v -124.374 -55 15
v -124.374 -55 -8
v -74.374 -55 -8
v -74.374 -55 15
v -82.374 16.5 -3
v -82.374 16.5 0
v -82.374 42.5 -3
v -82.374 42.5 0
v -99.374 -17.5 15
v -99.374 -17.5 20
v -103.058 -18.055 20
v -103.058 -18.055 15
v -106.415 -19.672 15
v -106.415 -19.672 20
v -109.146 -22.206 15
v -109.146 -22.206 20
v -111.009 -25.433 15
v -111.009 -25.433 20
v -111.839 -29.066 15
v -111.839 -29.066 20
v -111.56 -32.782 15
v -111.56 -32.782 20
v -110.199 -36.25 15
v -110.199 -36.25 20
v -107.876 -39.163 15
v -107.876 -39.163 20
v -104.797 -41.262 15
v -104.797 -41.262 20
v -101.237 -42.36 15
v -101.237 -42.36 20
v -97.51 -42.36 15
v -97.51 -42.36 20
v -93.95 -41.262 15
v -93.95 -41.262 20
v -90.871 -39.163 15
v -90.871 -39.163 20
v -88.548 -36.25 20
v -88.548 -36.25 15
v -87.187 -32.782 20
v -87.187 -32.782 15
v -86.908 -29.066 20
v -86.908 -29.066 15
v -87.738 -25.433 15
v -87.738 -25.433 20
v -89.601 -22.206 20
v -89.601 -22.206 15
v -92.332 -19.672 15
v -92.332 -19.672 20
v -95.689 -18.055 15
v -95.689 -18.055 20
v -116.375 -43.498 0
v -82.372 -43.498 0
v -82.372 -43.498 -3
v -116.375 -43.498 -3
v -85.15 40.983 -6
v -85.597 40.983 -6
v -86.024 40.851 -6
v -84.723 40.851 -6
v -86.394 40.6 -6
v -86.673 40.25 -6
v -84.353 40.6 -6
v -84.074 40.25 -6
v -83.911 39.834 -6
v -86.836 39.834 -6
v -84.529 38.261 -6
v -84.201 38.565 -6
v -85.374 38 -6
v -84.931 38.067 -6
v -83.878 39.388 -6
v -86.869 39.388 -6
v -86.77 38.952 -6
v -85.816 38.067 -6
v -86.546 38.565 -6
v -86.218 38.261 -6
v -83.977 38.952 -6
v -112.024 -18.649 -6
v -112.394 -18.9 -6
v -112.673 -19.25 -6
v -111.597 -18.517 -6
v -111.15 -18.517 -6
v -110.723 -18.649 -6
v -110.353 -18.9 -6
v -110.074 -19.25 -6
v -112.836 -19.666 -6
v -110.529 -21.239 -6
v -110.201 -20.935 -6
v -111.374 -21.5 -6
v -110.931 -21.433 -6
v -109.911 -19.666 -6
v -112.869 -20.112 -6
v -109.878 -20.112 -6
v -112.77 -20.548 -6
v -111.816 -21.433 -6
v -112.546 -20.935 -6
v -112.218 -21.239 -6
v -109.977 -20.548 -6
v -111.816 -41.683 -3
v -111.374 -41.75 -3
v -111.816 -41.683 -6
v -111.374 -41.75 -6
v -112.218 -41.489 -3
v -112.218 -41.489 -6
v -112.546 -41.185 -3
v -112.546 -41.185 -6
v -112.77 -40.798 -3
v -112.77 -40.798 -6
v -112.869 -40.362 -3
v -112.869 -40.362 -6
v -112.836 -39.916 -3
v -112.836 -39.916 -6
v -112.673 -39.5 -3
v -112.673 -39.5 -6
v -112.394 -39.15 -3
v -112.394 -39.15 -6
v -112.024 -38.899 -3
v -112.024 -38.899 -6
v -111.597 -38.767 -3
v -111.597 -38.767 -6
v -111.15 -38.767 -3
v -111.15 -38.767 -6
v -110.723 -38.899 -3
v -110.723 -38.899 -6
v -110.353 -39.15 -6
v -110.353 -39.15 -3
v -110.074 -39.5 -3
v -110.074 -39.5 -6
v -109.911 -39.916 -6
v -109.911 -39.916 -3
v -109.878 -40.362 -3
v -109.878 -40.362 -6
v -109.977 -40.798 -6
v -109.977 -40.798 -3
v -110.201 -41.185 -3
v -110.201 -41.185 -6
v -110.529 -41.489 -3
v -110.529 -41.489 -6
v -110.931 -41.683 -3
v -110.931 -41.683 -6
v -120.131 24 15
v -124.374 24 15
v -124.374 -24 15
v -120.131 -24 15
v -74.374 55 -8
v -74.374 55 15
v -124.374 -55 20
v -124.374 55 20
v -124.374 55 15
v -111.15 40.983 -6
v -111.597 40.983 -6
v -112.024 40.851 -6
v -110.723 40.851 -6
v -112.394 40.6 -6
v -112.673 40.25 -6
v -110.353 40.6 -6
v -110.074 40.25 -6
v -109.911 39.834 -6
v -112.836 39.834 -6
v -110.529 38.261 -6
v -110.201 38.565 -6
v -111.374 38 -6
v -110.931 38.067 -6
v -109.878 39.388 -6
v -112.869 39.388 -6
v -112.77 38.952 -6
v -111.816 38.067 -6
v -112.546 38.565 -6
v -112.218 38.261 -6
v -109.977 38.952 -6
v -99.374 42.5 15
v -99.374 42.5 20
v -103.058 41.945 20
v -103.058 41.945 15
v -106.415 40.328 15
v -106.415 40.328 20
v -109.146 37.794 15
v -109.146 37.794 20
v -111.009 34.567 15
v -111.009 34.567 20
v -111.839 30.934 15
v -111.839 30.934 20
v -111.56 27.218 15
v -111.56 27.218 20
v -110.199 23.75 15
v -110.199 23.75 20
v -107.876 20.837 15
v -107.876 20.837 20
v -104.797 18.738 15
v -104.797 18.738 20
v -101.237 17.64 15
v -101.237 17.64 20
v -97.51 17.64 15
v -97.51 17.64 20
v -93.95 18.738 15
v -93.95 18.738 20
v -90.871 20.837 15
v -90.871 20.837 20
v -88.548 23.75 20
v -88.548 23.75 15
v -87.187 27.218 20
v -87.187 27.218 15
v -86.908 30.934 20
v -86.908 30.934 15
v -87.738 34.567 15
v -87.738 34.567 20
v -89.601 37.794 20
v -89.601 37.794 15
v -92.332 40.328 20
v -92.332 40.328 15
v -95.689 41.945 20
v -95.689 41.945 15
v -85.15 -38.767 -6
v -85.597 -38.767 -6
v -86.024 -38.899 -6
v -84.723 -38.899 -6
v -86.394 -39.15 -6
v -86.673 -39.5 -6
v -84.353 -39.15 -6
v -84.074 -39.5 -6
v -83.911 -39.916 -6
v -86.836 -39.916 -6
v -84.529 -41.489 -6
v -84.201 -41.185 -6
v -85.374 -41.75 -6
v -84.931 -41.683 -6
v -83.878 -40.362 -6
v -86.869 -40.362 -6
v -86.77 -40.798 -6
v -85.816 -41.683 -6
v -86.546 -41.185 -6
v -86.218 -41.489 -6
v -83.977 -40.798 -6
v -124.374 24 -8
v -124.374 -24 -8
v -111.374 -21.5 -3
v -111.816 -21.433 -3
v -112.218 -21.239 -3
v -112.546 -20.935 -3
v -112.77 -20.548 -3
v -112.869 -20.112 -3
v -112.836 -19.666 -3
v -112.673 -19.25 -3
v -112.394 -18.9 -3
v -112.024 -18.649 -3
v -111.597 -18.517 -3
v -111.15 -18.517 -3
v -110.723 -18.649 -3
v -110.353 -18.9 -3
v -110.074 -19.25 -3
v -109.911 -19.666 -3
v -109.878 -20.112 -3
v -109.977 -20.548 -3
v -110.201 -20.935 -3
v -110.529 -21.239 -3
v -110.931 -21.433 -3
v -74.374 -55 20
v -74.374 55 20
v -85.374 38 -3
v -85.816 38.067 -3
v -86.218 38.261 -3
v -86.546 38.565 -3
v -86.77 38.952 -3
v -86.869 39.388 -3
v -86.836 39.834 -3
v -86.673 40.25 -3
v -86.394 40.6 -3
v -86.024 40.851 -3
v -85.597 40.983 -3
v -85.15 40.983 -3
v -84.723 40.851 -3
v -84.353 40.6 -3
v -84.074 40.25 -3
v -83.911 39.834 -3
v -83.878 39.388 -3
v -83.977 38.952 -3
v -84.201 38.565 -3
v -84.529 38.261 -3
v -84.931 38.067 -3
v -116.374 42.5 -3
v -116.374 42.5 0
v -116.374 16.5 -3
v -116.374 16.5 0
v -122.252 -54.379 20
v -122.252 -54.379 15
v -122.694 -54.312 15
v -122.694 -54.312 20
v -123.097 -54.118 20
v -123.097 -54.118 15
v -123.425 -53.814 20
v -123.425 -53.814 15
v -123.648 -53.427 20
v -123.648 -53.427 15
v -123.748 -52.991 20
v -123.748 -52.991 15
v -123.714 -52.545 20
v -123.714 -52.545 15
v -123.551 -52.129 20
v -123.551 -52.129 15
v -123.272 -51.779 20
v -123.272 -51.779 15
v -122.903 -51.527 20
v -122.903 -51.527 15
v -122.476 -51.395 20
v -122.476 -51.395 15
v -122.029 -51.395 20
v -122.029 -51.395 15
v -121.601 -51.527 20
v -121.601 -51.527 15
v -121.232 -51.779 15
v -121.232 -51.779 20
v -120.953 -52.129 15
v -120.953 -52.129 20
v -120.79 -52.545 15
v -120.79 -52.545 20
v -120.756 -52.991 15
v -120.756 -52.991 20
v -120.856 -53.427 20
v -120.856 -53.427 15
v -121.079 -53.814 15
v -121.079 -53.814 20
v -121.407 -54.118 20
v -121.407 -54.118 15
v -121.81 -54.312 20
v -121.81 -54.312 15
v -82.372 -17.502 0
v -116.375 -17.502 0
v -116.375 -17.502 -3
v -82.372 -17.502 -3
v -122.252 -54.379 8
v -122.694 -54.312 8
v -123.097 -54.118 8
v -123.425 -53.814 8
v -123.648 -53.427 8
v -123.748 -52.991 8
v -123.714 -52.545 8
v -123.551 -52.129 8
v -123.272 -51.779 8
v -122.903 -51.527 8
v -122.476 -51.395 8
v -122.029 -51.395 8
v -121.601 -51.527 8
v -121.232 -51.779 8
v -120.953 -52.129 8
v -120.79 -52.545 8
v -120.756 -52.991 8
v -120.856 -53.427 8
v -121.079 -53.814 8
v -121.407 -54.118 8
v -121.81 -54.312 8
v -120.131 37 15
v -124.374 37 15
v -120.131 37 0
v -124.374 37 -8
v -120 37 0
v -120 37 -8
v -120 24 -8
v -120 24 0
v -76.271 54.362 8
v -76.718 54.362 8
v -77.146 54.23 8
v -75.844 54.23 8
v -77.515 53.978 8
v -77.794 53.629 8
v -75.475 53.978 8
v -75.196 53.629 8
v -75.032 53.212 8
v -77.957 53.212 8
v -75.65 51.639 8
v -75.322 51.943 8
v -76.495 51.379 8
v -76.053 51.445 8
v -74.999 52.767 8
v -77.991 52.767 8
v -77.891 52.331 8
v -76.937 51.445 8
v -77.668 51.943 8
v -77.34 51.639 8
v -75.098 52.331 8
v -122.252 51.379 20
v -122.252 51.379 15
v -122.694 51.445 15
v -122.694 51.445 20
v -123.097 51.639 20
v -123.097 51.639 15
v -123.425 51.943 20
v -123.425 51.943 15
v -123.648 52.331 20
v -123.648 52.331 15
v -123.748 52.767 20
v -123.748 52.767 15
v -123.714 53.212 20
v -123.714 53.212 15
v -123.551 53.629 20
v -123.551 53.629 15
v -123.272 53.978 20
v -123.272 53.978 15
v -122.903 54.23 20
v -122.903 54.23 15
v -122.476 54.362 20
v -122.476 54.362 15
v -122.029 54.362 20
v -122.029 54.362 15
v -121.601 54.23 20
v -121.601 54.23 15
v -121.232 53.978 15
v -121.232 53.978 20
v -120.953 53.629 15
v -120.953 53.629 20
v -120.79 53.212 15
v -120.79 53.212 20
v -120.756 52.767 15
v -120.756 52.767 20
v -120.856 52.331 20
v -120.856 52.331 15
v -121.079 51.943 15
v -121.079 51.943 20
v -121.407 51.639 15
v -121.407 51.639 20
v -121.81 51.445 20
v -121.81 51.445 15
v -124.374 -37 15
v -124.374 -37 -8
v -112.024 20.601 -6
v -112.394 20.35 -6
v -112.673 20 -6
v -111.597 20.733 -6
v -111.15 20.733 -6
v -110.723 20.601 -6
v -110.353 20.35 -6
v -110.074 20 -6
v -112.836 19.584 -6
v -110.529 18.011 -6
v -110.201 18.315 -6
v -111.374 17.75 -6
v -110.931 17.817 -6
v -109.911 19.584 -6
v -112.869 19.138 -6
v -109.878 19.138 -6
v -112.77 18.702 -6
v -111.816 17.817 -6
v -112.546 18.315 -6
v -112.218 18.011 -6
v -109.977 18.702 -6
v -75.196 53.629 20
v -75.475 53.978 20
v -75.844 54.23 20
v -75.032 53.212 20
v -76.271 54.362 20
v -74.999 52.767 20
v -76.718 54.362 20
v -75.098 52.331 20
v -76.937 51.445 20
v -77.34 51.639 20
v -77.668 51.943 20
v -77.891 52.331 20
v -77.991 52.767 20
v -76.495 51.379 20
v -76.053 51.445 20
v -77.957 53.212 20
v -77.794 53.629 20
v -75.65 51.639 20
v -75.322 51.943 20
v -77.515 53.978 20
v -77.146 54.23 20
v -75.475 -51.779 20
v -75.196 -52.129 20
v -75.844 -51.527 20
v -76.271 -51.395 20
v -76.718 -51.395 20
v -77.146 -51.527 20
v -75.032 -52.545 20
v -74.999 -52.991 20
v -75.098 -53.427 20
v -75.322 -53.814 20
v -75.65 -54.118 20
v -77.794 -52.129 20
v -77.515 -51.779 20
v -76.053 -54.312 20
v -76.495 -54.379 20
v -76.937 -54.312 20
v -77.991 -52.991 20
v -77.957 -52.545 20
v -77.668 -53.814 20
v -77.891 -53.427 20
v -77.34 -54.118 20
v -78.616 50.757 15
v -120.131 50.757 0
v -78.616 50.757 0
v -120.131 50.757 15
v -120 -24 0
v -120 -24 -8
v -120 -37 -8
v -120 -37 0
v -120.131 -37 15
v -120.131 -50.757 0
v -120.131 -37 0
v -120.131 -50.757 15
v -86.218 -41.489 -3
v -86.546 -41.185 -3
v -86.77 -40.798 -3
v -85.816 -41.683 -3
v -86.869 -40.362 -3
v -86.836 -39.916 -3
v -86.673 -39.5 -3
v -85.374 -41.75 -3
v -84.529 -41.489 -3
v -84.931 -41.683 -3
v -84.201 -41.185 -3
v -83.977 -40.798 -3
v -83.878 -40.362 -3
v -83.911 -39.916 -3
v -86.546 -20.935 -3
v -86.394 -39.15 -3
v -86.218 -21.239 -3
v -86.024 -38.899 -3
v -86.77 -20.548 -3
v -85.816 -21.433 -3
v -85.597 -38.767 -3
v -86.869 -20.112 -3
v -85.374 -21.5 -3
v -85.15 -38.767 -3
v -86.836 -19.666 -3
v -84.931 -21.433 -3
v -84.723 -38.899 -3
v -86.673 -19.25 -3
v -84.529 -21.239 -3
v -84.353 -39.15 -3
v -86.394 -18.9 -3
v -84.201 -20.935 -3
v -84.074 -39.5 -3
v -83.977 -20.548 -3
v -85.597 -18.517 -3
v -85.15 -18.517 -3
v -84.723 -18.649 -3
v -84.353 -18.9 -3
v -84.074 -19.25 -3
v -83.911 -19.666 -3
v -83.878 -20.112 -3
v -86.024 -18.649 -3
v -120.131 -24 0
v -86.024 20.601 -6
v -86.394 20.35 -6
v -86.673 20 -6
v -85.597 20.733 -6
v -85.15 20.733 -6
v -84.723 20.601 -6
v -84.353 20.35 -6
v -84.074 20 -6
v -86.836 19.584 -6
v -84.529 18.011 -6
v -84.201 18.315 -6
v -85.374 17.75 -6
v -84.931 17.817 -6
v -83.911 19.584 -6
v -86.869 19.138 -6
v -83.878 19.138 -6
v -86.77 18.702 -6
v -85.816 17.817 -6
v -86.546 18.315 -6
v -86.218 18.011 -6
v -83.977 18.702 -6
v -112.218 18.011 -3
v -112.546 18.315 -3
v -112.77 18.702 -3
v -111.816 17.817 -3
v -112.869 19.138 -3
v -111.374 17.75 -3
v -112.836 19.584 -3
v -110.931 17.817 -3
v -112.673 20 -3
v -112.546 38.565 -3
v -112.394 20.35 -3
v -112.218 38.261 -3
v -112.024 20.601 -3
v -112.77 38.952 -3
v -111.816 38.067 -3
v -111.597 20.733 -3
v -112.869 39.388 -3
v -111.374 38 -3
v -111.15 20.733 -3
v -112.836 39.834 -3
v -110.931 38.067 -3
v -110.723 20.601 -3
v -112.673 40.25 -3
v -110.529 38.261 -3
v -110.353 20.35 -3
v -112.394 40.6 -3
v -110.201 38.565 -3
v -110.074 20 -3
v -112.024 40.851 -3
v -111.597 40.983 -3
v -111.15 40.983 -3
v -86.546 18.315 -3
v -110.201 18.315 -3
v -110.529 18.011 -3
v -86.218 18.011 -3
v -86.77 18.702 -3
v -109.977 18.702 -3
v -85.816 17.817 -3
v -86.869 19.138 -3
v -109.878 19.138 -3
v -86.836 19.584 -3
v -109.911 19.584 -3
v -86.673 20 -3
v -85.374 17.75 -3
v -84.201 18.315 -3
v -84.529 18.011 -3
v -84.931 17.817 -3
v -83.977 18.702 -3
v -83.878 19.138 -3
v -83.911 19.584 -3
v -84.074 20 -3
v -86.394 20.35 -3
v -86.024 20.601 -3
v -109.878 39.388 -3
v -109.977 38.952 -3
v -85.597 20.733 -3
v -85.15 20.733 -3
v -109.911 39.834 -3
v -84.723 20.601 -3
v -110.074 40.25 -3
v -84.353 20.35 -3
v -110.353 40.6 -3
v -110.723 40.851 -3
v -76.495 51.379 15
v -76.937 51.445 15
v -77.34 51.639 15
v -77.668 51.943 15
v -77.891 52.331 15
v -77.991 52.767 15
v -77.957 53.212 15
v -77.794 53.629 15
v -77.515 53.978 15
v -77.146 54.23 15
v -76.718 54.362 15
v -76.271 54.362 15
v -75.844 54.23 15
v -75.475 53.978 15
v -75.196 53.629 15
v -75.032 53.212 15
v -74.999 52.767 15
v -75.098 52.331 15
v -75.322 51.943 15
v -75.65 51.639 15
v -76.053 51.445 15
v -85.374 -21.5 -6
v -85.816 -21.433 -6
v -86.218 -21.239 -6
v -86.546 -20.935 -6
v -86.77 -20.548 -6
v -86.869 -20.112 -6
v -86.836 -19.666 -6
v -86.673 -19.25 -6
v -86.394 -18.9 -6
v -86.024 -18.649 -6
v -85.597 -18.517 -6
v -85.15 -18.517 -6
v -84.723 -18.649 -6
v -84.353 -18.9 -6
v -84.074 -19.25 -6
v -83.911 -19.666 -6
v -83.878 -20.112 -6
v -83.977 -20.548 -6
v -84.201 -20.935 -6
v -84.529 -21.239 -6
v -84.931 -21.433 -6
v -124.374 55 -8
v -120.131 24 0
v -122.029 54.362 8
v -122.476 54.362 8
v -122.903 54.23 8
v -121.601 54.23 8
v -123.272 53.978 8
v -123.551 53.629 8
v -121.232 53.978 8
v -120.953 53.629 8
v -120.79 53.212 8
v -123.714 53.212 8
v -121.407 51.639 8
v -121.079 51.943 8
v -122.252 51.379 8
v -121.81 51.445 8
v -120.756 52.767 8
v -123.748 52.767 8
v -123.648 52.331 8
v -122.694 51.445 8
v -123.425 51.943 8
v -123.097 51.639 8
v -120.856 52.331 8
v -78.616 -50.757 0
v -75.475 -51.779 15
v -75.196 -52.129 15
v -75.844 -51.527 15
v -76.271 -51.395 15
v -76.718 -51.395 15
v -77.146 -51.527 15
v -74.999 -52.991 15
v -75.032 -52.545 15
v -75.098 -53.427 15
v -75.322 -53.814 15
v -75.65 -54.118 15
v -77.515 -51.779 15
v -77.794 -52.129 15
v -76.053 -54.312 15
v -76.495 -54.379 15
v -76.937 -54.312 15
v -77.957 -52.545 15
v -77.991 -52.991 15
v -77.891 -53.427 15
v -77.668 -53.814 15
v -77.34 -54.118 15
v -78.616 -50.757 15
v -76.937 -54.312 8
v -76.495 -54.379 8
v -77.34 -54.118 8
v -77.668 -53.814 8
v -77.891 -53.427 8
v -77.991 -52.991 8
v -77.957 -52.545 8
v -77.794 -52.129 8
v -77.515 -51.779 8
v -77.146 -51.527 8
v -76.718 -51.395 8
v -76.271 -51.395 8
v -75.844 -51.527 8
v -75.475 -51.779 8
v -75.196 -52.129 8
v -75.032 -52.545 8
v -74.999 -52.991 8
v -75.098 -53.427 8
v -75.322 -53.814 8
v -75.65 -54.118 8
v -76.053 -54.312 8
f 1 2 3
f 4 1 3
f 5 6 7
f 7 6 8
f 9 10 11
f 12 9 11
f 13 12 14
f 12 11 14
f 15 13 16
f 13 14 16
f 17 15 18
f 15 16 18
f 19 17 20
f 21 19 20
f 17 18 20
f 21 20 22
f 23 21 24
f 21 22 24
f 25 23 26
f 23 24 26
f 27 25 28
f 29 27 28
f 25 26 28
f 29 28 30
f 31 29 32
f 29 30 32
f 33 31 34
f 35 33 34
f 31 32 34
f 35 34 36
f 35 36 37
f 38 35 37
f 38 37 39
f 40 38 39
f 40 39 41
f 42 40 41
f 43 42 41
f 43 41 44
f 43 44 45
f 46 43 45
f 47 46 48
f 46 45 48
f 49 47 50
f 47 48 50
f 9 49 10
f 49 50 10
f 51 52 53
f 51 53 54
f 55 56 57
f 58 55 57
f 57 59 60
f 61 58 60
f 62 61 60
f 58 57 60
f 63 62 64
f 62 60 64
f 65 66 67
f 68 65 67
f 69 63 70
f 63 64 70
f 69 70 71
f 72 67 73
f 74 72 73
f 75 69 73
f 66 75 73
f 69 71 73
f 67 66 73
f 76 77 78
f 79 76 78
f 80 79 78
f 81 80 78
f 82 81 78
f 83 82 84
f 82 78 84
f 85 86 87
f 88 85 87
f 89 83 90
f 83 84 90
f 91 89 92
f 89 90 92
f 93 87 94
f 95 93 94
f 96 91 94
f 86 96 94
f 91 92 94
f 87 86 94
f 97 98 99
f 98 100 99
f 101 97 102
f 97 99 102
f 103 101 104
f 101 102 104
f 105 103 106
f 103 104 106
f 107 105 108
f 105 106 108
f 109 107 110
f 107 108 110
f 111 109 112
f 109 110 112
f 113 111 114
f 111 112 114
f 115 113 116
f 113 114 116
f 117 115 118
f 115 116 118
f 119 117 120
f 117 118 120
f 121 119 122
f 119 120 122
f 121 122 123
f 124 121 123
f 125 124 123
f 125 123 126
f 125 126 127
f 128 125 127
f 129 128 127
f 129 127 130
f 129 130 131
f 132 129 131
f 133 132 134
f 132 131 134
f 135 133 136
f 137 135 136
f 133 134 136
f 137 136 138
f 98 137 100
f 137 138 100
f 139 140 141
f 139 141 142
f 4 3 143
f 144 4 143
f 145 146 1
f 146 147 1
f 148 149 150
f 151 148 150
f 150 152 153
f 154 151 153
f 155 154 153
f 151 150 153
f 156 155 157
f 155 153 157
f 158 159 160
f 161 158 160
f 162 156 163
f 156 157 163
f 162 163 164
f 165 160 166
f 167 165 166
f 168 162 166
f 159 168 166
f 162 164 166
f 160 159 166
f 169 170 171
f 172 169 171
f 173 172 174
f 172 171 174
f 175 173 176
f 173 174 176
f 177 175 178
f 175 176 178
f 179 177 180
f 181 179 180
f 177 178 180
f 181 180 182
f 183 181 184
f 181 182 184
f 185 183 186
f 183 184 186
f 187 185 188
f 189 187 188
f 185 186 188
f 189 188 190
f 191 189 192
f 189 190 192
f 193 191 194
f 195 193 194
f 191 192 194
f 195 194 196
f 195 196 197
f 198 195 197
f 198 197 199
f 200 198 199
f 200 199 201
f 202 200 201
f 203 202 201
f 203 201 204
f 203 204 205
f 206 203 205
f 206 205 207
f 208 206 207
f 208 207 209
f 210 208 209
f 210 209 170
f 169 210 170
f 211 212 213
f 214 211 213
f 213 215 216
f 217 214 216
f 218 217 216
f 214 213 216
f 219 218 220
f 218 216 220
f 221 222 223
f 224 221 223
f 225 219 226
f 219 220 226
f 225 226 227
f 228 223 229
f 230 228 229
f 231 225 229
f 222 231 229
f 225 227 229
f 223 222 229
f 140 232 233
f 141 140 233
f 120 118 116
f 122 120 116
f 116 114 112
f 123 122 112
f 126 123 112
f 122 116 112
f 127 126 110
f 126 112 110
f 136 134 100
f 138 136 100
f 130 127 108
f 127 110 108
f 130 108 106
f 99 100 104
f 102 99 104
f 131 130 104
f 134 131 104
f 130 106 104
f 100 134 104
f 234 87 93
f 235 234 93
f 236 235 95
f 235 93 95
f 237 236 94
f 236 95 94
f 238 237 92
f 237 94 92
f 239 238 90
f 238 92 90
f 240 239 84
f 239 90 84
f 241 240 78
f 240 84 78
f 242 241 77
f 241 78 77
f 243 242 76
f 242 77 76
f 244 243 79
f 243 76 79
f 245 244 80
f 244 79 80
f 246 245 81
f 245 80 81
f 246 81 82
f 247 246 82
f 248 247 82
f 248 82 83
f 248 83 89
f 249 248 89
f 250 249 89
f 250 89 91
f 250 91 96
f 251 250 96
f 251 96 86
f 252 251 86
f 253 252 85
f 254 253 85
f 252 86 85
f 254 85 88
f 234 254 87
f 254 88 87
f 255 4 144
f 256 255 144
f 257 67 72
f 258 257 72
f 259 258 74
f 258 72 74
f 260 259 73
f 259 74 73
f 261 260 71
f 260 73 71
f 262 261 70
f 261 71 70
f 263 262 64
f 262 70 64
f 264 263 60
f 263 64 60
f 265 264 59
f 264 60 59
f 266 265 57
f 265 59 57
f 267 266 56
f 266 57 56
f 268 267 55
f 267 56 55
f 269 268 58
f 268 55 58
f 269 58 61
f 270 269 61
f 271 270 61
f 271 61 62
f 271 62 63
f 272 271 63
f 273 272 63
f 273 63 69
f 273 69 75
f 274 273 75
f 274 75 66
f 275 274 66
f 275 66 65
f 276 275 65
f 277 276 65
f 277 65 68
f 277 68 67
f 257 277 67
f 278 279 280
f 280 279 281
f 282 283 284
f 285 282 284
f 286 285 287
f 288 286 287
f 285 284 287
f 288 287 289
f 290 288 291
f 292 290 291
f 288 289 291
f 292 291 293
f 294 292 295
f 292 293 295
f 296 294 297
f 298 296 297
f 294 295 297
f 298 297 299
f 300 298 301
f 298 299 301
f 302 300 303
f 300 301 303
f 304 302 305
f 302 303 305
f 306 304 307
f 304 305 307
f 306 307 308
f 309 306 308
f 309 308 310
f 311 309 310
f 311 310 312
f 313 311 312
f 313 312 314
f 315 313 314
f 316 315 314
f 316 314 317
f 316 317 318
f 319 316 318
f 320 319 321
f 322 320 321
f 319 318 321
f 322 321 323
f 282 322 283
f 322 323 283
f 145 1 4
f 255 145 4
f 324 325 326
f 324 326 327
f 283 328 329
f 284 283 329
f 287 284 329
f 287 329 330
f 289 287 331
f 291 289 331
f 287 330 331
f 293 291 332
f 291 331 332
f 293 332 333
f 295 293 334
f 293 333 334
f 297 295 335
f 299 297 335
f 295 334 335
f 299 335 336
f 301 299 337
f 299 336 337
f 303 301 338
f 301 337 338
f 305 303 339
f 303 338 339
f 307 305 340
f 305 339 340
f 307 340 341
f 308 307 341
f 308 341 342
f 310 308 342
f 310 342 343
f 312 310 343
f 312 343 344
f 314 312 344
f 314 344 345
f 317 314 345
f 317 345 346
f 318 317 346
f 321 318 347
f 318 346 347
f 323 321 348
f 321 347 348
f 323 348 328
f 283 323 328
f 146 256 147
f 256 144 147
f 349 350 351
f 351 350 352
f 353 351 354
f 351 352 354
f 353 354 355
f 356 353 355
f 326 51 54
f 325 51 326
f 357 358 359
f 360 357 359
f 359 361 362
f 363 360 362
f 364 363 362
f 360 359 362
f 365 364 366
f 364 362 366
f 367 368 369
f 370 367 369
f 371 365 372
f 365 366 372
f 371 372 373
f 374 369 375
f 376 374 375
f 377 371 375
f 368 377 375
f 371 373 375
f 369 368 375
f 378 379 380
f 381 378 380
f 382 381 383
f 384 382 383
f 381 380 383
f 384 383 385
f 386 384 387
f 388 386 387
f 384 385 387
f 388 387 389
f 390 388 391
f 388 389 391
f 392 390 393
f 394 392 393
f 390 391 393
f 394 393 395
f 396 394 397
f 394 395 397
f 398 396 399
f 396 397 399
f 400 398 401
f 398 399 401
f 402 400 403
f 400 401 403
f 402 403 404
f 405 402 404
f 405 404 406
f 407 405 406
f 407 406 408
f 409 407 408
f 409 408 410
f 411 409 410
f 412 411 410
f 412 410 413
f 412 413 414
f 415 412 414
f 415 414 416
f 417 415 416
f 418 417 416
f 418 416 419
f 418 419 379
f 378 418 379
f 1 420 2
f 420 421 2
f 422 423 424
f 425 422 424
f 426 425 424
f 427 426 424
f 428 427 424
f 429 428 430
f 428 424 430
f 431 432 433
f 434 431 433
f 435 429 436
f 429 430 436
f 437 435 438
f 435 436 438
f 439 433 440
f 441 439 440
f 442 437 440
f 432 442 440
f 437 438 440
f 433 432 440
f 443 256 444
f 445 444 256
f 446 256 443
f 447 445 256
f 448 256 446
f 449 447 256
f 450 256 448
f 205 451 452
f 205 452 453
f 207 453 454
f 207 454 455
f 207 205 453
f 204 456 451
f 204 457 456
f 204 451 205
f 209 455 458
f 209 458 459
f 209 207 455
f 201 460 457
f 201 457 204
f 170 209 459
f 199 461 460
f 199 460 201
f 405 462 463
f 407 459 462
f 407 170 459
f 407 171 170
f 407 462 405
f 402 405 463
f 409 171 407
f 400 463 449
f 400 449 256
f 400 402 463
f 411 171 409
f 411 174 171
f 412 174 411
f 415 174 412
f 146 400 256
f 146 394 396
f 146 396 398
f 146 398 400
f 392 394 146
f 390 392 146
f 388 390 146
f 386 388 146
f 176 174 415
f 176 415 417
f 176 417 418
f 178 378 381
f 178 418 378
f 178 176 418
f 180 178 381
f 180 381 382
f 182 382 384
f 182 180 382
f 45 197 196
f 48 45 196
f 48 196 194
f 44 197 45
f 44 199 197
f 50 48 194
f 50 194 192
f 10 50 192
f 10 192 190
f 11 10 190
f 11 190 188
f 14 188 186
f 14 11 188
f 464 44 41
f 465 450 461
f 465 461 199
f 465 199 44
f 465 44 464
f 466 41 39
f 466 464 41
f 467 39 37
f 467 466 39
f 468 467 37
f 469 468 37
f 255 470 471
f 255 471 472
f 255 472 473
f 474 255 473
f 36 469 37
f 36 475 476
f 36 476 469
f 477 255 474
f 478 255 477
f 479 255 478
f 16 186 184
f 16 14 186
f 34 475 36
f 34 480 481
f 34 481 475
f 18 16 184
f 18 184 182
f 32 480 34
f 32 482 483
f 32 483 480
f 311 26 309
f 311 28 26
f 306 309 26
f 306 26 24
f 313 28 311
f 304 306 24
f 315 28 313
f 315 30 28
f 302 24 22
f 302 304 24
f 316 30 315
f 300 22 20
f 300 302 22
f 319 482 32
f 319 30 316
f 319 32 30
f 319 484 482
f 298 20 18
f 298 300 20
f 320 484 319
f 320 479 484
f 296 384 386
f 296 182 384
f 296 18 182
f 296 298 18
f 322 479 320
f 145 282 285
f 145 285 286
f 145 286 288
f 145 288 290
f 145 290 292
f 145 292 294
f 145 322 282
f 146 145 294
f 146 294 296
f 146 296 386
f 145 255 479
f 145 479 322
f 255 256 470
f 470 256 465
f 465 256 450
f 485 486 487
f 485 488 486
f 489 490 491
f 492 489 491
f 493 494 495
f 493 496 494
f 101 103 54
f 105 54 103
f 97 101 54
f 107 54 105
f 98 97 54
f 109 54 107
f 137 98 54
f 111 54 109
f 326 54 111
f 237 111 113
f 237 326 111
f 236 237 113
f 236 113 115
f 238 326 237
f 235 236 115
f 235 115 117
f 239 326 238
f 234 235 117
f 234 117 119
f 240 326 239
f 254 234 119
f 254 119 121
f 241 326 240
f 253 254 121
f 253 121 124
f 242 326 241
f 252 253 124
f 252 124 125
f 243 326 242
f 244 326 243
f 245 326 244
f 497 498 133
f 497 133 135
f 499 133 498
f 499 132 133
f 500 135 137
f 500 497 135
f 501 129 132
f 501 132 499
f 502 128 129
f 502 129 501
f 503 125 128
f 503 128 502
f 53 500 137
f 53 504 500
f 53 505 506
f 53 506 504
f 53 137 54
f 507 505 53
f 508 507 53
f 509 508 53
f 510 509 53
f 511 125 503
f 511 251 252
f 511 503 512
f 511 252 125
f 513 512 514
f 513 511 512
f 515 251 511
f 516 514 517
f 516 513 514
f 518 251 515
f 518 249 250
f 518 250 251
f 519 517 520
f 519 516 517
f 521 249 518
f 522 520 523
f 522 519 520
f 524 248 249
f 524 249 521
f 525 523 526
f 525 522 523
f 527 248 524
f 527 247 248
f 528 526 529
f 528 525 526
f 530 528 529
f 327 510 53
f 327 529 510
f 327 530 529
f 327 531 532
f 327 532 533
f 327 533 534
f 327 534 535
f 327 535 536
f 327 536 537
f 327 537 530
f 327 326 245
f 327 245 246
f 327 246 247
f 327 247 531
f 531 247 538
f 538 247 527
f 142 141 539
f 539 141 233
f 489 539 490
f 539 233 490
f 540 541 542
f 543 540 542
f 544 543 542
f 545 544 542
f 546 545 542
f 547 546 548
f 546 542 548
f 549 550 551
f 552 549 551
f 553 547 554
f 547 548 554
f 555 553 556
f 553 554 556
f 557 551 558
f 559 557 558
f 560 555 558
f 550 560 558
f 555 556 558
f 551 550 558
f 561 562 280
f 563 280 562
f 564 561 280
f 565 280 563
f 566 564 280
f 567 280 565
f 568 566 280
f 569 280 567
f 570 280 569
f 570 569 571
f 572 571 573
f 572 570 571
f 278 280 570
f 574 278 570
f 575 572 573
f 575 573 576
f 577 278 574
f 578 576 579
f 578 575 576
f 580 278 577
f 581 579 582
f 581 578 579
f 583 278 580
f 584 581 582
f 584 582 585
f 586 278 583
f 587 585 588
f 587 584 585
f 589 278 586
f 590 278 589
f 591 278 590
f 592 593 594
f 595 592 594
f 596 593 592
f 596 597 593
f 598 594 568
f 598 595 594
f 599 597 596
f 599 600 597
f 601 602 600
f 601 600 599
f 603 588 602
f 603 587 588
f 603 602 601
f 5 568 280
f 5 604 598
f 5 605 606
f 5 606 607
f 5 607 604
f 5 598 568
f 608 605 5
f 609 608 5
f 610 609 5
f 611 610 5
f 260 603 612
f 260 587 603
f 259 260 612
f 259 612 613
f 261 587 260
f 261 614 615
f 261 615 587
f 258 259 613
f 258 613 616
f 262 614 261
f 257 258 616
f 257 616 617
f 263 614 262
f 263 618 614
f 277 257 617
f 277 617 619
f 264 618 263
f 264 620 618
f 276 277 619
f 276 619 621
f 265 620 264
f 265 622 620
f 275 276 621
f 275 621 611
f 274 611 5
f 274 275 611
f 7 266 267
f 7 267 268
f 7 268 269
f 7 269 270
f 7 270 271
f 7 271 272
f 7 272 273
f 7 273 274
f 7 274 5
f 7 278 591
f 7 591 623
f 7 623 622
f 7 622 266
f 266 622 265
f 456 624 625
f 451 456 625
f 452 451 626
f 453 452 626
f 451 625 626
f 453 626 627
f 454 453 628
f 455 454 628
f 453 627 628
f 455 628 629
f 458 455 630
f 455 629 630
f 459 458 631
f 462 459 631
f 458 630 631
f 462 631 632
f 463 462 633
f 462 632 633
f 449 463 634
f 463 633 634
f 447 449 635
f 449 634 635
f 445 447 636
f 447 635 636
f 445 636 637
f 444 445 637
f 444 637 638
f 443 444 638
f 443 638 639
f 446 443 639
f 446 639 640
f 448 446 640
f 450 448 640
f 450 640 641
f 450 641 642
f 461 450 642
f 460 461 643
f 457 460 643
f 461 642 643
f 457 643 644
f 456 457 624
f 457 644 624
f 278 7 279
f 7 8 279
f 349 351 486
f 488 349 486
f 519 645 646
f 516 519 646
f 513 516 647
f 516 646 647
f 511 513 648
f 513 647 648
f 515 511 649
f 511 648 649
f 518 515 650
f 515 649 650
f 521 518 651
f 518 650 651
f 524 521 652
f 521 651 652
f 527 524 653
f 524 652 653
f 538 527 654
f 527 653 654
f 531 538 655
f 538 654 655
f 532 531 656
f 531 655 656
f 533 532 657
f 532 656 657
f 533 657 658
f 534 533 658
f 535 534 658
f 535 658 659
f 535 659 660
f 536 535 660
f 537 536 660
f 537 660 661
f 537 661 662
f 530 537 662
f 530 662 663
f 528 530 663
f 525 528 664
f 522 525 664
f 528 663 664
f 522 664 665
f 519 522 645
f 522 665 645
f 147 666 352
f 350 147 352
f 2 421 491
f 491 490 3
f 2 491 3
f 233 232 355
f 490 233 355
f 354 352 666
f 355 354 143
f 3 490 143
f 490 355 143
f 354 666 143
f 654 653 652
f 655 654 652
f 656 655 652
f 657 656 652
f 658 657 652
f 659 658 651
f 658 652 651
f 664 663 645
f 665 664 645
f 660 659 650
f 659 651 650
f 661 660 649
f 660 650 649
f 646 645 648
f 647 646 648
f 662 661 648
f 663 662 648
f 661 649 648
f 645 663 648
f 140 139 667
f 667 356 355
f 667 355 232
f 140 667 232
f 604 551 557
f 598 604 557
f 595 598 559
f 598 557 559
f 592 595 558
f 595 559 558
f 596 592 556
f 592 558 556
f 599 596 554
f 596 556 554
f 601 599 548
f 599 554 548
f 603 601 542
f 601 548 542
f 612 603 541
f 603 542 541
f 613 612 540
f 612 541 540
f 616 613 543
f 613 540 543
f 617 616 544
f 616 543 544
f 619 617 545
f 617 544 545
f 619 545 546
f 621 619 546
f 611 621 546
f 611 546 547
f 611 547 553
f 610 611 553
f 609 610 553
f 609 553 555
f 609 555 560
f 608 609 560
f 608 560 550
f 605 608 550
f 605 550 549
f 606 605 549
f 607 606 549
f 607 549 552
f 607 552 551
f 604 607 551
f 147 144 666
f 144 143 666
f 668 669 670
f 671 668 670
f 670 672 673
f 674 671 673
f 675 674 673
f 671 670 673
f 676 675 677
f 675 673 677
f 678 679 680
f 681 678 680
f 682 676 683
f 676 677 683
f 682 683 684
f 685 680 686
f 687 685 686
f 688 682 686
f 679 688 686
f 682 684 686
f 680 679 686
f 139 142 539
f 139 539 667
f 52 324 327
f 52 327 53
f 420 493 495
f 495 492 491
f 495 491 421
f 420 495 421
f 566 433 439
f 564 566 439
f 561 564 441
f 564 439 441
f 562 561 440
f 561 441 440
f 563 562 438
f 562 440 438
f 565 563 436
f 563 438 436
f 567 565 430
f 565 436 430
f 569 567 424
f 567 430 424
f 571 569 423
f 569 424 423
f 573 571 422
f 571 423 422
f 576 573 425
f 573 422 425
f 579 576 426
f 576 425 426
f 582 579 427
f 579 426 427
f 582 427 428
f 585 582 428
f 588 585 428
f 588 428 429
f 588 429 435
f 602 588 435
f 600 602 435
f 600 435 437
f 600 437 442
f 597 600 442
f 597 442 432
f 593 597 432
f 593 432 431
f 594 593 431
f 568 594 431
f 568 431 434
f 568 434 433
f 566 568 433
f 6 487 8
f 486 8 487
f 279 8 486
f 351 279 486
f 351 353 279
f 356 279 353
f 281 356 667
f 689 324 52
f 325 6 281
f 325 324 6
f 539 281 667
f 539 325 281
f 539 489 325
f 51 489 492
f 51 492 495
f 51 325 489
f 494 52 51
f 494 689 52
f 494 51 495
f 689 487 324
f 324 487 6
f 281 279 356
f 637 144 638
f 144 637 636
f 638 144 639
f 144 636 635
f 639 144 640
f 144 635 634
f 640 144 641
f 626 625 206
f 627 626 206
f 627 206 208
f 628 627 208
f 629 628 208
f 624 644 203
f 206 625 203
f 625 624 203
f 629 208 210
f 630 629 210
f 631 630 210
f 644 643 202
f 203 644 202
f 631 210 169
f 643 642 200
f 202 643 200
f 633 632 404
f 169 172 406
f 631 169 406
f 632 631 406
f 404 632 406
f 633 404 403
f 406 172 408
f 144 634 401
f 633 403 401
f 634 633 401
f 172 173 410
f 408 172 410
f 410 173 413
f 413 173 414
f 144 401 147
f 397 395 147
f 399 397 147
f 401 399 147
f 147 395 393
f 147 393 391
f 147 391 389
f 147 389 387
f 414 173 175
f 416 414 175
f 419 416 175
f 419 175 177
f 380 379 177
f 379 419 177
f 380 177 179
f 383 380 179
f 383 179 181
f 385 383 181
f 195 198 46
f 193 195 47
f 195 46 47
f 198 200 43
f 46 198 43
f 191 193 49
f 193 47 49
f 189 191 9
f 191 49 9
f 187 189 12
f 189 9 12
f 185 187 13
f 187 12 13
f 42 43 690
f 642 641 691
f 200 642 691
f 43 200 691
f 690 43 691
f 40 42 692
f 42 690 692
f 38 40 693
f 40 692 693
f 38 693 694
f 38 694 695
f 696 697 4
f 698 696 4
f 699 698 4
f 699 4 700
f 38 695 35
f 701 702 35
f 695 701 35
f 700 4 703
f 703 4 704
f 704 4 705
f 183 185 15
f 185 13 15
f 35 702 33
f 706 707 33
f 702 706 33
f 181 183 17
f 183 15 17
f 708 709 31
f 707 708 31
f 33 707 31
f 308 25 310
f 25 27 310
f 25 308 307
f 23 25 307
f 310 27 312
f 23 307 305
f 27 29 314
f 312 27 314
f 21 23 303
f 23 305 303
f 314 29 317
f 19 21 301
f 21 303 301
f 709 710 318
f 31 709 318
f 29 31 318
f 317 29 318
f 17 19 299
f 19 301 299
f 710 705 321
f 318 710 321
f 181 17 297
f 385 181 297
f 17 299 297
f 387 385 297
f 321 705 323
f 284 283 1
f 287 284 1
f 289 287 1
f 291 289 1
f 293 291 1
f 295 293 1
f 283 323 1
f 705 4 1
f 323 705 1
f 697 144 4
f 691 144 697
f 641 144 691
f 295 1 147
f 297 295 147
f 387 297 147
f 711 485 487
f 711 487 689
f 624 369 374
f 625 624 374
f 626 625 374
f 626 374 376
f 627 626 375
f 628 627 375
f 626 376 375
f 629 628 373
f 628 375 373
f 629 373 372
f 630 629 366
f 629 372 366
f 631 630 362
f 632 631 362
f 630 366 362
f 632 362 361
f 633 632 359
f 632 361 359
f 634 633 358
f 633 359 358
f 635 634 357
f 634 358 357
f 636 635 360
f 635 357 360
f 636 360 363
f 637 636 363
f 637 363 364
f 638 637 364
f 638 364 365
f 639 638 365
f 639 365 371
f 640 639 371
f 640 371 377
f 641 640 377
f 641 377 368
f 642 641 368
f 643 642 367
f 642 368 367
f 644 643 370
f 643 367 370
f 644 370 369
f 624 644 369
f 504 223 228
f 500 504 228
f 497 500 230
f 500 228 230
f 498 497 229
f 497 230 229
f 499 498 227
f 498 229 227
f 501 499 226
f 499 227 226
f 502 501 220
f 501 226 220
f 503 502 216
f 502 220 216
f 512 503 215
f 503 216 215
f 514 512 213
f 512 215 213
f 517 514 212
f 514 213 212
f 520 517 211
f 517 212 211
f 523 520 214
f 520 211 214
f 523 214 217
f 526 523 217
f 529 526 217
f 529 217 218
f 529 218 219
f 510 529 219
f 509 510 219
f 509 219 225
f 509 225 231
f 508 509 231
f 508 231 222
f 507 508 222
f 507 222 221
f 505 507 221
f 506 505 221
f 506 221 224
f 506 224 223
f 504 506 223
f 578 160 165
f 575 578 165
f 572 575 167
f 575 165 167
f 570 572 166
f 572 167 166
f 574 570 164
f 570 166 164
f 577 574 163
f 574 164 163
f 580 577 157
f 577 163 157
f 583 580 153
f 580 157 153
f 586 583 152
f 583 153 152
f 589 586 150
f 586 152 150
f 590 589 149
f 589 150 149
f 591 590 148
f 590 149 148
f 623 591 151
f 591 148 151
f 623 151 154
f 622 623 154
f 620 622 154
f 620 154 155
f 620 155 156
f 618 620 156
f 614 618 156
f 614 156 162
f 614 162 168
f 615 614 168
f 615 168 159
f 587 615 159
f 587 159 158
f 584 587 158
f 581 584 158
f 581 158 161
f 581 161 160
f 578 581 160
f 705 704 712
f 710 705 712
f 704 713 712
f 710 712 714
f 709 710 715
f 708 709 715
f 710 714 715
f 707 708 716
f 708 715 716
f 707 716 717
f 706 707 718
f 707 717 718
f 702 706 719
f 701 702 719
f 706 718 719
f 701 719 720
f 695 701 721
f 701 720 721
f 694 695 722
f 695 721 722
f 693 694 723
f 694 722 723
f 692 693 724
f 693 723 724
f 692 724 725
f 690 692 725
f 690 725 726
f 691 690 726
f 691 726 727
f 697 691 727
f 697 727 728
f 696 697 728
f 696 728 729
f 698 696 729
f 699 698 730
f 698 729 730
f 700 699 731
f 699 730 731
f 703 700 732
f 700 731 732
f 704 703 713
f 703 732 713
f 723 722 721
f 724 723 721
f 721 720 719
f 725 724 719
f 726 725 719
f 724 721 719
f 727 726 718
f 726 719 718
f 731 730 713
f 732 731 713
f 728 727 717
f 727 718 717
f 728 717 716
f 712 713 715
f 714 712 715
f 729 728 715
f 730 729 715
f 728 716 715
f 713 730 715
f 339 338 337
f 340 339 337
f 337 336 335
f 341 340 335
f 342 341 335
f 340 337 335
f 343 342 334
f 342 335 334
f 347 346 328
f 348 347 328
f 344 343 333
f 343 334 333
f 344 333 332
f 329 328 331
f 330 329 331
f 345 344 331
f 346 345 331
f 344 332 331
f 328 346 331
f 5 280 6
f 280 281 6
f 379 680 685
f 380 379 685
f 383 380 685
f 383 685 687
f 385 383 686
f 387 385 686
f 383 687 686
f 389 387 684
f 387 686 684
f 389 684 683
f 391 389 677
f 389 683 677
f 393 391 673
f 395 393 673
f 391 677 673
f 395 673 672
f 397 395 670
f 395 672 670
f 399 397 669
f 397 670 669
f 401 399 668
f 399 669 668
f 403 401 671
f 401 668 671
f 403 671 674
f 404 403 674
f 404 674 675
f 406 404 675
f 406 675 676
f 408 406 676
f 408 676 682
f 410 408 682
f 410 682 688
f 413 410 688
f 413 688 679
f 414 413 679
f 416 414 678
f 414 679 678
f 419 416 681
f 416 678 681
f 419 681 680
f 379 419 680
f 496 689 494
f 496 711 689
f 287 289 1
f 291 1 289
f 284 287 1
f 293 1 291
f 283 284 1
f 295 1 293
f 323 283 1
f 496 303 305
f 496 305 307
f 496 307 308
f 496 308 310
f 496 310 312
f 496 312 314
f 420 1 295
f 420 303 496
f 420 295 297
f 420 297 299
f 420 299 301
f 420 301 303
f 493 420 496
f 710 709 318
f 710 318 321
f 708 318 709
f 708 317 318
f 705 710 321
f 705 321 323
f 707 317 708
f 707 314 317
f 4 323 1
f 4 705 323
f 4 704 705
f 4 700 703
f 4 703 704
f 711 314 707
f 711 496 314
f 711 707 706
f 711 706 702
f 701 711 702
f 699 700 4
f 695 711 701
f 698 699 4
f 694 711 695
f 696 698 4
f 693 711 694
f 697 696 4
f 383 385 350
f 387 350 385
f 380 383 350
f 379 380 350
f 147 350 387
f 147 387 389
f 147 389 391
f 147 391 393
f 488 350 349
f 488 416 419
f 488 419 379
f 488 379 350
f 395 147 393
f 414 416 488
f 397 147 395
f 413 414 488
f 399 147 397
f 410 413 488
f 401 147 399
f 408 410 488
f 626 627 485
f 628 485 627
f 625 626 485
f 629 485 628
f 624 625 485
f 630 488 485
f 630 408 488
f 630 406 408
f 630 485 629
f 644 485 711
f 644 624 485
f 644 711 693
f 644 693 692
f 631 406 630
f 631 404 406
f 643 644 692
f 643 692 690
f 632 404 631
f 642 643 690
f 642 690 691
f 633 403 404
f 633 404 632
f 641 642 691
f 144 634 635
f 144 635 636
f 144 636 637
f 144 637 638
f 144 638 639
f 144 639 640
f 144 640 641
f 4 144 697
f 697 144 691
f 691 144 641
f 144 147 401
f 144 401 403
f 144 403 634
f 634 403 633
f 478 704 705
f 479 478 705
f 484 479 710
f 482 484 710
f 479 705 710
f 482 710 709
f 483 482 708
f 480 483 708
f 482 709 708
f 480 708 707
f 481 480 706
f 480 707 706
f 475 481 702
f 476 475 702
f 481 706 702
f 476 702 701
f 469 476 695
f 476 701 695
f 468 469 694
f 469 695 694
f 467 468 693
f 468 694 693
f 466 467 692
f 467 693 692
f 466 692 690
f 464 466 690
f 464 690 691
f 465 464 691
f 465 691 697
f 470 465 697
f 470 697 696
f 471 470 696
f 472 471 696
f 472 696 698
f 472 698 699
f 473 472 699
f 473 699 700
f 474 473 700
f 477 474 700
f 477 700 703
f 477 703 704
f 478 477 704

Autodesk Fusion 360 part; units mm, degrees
sketch "Bottom Base" plane through (0, 0, 0) normal (0, 0, 1) x (1, 0, 0)
  line L0 (-74.3735, 55) -> (-124.3735, 55)
  line L1 (-124.3735, 55) -> (-124.3735, -55)
  line L2 (-124.3735, -55) -> (-74.3735, -55)
  line L3 (-74.3735, -55) -> (-74.3735, 55)
  line L4 (-82.3735, 42.5) -> (-116.3735, 42.5)
  line L5 (-116.3735, 42.5) -> (-116.3735, 16.5)
  line L6 (-116.3735, 16.5) -> (-82.3735, 16.5)
  line L7 (-82.3735, 16.5) -> (-82.3735, 42.5)
  line L8 (-82.3735, 42.5) -> (-116.3735, 16.5) construction
  line L9 (-116.3735, 42.5) -> (-82.3735, 16.5) construction
  line L10 (-116.3754, -17.5022) -> (-82.3715, -17.5022)
  line L11 (-82.3715, -17.5022) -> (-82.3715, -43.4978)
  line L12 (-82.3715, -43.4978) -> (-116.3754, -43.4978)
  line L13 (-116.3754, -43.4978) -> (-116.3754, -17.5022)
  line L14 (-116.3754, -17.5022) -> (-82.3715, -43.4978) construction
  line L15 (-82.3715, -17.5022) -> (-116.3754, -43.4978) construction
  line L16 (-82.3735, 42.5) -> (-82.3735, 39.5)
  line L17 (-82.3735, 39.5) -> (-85.3735, 39.5)
  line L18 (-82.3735, 39.5) -> (-111.3735, 39.5)
  line L19 (-124.3735, 37) -> (-124.3735, 24)
  line L20 (-124.3735, -24) -> (-124.3735, -37)
  line L21 (-124.3735, 37) -> (-120, 37)
  line L22 (-120, 37) -> (-120, 24)
  line L23 (-120, 24) -> (-124.3735, 24)
  line L24 (-124.3735, -24) -> (-120, -24)
  line L25 (-120, -24) -> (-120, -37)
  line L26 (-120, -37) -> (-124.3735, -37)
  line L27 (-85.3735, 39.5) -> (-85.3735, 19.25)
  line L28 (-85.3735, 19.25) -> (-111.3735, 19.25)
  line L29 (-99.3735, -30.5) -> (-99.3735, -30)
  curve L30
  curve L31
  point P0 (-99.3735, 29.5)
  point P1 (-99.3735, -30.5)
  point P2 (-124.3735, 30.5)
  point P3 (-124.3735, -30.5)
  point P4 (-111.3735, -40.25)
  point P5 (-85.3735, -40.25)
  point P6 (-111.3735, -20)
  point P7 (-85.3735, -20)
  dimension "d1" = 110
  dimension "d2" = 50
  dimension "d10" = 34
  dimension "d11" = 26
  dimension "d14" = 3
  dimension "d15" = 3
  dimension "d16" = 29
  dimension "d26" = 13
  dimension "d62" = 20.25
  dimension "d63" = 26
  dimension "d68" = 15
extrude "Extrude1" add sketch "Bottom Base" along normal blind 15 and the other way blind 8 contours L0 L1 L2 L3 L21 L22 L23 L24 L25 L26 | L4 L5 L6 L7 L16 | L10 L11 L12 L13 makes body 1
sketch "Top Base" plane through (0, 0, 15) normal (0, 0, 1) x (-1, 0, 0)
  line L0 (74.3735, 55) -> (74.3735, -55)
  line L1 (74.3735, -55) -> (124.3735, -55)
  line L2 (124.3735, -55) -> (124.3735, 55)
  line L3 (124.3735, 55) -> (74.3735, 55)
  line L4 (74.3735, 55) -> (78.6161, 50.7574)
  line L5 (74.3735, 55) -> (80.3735, 55) construction
  line L6 (74.3735, -55) -> (78.6161, -50.7574)
  line L7 (74.3735, -55) -> (80.3735, -55) construction
  line L8 (124.3735, -55) -> (120.1308, -50.7574)
  line L9 (124.3735, -55) -> (115.8882, -55) construction
  line L10 (120.1308, -50.7574) -> (78.6161, -50.7574)
  line L11 (78.6161, -50.7574) -> (78.6161, 50.7574)
  line L12 (78.6161, 50.7574) -> (120.1308, 50.7574)
  line L13 (120.1308, 50.7574) -> (120.1308, -50.7574)
  dimension "d32" = 45
  dimension "d33" = 6
  dimension "d34" = 45
  dimension "d35" = 6
  dimension "d37" = 6
extrude "Extrude3" cut sketch "Bottom Base" against normal blind 3 contours L4 L5 L6 L7 L16 | L10 L11 L12 L13 bodies 1
extrude "Extrude5" cut sketch "Bottom Base" along normal blind 15 contours L1 L19 L21 L22 L23 bodies 1
extrude "Extrude6" cut sketch "Bottom Base" along normal blind 15 contours L1 L20 L24 L25 L26 bodies 1
extrude "Extrude7" cut sketch "Top Base" against normal blind 15 contours L10 L11 L12 L13 bodies 1
extrude "Extrude8" add sketch "Top Base" along normal blind 5 separate body makes body 2
sketch "Panel Fasteners" plane through (0, 0, 20) normal (0, 0, 1) x (-1, 0, 0)
  line L0 (124.3735, 55) -> (74.3735, 55)
  line L1 (74.3735, 55) -> (74.3735, -55)
  line L2 (74.3735, -55) -> (124.3735, -55)
  line L3 (124.3735, -55) -> (124.3735, 55)
  line L4 (74.3735, 55) -> (76.4948, 52.8787)
  line L5 (74.3735, 55) -> (77.3735, 55) construction
  line L6 (74.3735, -55) -> (76.4948, -52.8787)
  line L7 (74.3735, -55) -> (77.3735, -55) construction
  line L8 (124.3735, -55) -> (122.2521, -52.8787)
  line L9 (124.3735, -55) -> (121.3735, -55) construction
  line L10 (124.3735, 55) -> (122.2521, 52.8787)
  line L11 (124.3735, 55) -> (121.3735, 55) construction
  dimension "d47" = 45
  dimension "d48" = 3
  dimension "d49" = 45
  dimension "d50" = 3
  dimension "d54" = 45
  dimension "d55" = 3
  dimension "d56" = 45
  dimension "d57" = 3
hole "Hole4" at (-76.4948, -52.8787, 20) at (-122.2521, -52.8787, 20) at (-122.2521, 52.8787, 20) at (-76.4948, 52.8787, 20) direction (0, 0, -1) diameter 3 depth 12 tip angle 180 bodies 1 2
hole "Hole5" at (-111.3735, 19.25, 0) at (-111.3735, 39.5, 0) at (-85.3735, 39.5, 0) at (-85.3735, 19.25, 0) at (-111.3735, -20, 0) at (-111.3735, -40.25, 0) at (-85.3735, -40.25, 0) at (-85.3735, -20, 0) direction (0, 0, -1) diameter 3 depth 6 tip angle 180 bodies 1
hole "Hole6" at (-99.3735, -30, 15) at (-99.3735, 30, 15) direction (0, 0, 1) diameter 25 depth 5 tip angle 180 bodies 2
